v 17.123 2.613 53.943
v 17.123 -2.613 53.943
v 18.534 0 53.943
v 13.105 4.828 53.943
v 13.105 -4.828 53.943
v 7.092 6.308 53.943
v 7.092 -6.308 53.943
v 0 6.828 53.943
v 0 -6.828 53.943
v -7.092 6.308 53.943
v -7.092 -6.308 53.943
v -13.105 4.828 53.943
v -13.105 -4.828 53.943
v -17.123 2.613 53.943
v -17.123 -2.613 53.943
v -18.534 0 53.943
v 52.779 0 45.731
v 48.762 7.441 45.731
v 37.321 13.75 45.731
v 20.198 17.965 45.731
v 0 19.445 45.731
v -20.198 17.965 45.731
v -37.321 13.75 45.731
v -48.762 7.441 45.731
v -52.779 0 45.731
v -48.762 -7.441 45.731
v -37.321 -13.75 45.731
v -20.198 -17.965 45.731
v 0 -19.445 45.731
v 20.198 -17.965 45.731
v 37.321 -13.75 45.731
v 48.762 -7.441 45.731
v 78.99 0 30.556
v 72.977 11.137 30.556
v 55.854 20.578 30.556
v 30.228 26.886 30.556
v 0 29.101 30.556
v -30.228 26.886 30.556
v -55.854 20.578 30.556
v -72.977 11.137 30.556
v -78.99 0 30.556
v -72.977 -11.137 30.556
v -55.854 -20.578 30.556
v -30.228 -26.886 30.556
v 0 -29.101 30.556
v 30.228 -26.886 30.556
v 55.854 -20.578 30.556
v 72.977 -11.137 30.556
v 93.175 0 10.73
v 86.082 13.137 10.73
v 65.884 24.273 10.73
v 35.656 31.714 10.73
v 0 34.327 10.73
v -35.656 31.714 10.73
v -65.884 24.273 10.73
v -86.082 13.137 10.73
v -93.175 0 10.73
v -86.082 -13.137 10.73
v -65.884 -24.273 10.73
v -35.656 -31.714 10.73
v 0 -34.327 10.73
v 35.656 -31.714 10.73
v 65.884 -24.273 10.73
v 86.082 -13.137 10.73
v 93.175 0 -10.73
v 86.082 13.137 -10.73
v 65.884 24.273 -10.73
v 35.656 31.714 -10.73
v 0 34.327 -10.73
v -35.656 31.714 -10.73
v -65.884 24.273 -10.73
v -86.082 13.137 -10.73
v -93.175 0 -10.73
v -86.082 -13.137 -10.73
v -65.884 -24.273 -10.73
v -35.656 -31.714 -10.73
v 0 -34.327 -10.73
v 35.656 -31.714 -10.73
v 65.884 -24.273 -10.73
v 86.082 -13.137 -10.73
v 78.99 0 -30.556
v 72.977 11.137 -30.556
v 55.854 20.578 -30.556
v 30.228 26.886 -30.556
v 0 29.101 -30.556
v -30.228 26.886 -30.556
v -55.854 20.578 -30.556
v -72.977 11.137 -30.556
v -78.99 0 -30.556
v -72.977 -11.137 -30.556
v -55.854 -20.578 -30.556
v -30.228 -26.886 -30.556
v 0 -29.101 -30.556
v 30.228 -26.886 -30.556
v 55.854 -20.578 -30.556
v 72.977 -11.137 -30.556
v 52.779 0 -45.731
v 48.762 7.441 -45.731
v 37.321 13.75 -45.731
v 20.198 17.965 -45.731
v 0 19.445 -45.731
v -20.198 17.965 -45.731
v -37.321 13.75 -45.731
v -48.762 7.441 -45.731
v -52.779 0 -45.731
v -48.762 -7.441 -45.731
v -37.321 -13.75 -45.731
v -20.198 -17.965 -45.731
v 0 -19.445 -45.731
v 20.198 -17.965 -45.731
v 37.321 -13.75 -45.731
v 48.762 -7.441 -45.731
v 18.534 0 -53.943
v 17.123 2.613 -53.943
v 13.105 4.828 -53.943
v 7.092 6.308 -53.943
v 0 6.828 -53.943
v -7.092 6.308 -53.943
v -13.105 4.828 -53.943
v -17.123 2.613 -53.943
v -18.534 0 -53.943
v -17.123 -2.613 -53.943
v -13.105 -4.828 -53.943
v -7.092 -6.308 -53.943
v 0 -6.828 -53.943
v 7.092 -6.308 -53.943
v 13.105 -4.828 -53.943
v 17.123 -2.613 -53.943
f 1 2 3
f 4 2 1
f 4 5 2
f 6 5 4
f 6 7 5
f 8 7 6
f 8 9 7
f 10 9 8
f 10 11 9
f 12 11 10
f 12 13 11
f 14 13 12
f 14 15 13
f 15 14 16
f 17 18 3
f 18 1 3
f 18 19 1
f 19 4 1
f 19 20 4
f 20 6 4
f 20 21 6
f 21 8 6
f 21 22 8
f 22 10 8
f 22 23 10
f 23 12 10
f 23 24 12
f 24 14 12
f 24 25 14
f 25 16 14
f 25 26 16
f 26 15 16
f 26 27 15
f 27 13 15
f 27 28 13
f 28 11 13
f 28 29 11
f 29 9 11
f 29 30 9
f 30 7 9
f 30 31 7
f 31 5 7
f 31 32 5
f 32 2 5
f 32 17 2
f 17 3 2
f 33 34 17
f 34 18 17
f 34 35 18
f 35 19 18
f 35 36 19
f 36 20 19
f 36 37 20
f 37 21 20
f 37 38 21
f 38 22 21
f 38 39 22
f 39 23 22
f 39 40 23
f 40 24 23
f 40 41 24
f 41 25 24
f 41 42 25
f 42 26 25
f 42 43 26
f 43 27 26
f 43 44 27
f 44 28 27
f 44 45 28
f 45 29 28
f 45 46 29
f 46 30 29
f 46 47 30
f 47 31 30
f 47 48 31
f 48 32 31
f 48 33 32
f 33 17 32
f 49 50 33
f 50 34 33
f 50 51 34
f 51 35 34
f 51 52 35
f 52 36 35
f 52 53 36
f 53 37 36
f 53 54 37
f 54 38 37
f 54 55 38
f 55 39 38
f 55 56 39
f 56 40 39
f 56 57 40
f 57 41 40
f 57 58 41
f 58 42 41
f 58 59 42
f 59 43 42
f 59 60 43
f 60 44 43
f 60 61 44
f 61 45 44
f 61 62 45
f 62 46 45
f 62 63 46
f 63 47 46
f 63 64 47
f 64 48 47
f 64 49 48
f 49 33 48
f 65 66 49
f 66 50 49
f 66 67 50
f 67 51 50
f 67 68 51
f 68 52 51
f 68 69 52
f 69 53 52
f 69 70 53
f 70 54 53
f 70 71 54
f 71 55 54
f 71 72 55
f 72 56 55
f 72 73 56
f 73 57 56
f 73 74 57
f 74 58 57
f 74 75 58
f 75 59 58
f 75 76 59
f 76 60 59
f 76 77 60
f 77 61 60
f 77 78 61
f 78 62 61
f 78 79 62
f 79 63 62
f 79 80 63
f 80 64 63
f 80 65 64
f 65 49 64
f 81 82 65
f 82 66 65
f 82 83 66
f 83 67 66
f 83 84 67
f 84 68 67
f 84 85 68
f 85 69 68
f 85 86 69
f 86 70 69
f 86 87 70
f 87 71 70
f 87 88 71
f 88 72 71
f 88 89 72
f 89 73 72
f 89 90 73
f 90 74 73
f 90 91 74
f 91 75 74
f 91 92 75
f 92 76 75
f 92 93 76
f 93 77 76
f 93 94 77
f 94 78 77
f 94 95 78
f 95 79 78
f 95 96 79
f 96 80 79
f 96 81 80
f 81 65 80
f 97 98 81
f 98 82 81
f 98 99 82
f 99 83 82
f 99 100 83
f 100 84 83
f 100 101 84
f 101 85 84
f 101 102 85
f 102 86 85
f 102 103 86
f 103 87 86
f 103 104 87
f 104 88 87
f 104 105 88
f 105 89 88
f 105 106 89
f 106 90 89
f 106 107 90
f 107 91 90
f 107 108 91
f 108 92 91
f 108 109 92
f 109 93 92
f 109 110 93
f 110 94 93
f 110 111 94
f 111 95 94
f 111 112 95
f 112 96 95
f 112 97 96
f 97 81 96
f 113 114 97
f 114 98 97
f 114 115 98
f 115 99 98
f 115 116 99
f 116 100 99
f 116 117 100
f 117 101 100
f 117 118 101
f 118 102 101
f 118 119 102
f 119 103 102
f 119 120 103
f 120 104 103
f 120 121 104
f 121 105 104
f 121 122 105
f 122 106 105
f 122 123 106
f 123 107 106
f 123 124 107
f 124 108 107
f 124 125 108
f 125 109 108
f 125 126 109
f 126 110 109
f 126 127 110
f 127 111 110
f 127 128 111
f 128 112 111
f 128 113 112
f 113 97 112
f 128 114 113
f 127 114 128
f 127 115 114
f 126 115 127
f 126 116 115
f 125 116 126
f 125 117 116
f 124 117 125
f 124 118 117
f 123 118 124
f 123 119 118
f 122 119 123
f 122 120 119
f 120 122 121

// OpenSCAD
// Generated by SolidPython 1.0.1 on 2020-07-29 00:46:53


scale(v = [19, 7, 11]) {
	sphere(r = 5);
}
/***********************************************
*********      SolidPython code:      **********
************************************************
 
# import packages: SolidPython
from solid import *
from solid.utils import *
from itertools import chain, combinations, permutations


class Resize:

    def __init__(self, scad_file):
        self.scad_file = scad_file
        #self.scad_file = import_scad(scad_file)
        # cone/cylinder param:
        self.r1 = 0
        self.r2 = 0
        self.h = 0
        # rectangular prism param:
        self.w = 0
        self.l = 0
        # ellipse param:
        self.r = 0

    # import OpenScad code (file name corresponds to shape)


    # classify shape + parameters
    def assign(self, param1, param2, param3):
        if self.scad_file == 'cone.scad':
            self.r1 = param1
            self.r2 = param2
            self.h = param3
        elif self.scad_file == 'cylinder.scad':
            self.r1 = param1
            self.r2 = param2
            self.h = param3
        elif self.scad_file == 'rectangularPrism.scad':
            self.h = param1
            self.l = param2
            self.w = param3
        else:
            self.r = param1
            self.h = param2

    # resize parameters
    def iterate(self):
        x = range(3, 20, 2)
        i = 1
        if self.scad_file == 'cone.scad':
            tempList = list(permutations(x, 2))
            for temp in tempList:
                param1 = temp[0]
                param2 = temp[1]
                filepath = 'produced_scad_files/' + 'cone' + str(param1) + '_' + str(param2) + '_' + '.scad'
                scad_render_to_file(cylinder(h=param1, r1=param2, r2=0), filepath)

        elif self.scad_file == 'cylinder.scad':
            tempList = list(permutations(x, 3))
            for temp in tempList:
                param1 = temp[0]
                param2 = temp[1]
                filepath = 'produced_scad_files/' + 'cylinder' + str(param1) + '_' + str(param2) + '_' + '.scad'
                scad_render_to_file(cylinder(h=param1, r1=param2, r2=param2), filepath)

        elif self.scad_file == 'rectangularPrism.scad':
            tempList = list(permutations(x, 3))
            for temp in tempList:
                param1 = temp[0]
                param2 = temp[1]
                param3 = temp[2]
                filepath = 'produced_scad_files/' + 'rectangularPrism' + str(param1) + '_' + str(param2) + '_' + str(
                    param3) + '.scad'
                scad_render_to_file(cube(size=(param1, param2, param3)), filepath)

        elif self.scad_file == 'ellipse.scad':
            tempList = list(permutations(x, 4))
            for temp in tempList:
                param1 = temp[0]
                param2 = temp[1]
                param3 = temp[2]
                param4 = temp[3]
                filepath = 'produced_scad_files/' + 'ellipse' + str(param1) + '_' + str(param2) + '_' + str(param3) + '_' + str(param4) + '.scad'
                scad_render_to_file(scale([param1, param2, param3])(sphere(r=param4)), filepath)

    def render_to_scadfile(self):
        scad_render_to_file(scad, 'example.scad') 
 
************************************************/
